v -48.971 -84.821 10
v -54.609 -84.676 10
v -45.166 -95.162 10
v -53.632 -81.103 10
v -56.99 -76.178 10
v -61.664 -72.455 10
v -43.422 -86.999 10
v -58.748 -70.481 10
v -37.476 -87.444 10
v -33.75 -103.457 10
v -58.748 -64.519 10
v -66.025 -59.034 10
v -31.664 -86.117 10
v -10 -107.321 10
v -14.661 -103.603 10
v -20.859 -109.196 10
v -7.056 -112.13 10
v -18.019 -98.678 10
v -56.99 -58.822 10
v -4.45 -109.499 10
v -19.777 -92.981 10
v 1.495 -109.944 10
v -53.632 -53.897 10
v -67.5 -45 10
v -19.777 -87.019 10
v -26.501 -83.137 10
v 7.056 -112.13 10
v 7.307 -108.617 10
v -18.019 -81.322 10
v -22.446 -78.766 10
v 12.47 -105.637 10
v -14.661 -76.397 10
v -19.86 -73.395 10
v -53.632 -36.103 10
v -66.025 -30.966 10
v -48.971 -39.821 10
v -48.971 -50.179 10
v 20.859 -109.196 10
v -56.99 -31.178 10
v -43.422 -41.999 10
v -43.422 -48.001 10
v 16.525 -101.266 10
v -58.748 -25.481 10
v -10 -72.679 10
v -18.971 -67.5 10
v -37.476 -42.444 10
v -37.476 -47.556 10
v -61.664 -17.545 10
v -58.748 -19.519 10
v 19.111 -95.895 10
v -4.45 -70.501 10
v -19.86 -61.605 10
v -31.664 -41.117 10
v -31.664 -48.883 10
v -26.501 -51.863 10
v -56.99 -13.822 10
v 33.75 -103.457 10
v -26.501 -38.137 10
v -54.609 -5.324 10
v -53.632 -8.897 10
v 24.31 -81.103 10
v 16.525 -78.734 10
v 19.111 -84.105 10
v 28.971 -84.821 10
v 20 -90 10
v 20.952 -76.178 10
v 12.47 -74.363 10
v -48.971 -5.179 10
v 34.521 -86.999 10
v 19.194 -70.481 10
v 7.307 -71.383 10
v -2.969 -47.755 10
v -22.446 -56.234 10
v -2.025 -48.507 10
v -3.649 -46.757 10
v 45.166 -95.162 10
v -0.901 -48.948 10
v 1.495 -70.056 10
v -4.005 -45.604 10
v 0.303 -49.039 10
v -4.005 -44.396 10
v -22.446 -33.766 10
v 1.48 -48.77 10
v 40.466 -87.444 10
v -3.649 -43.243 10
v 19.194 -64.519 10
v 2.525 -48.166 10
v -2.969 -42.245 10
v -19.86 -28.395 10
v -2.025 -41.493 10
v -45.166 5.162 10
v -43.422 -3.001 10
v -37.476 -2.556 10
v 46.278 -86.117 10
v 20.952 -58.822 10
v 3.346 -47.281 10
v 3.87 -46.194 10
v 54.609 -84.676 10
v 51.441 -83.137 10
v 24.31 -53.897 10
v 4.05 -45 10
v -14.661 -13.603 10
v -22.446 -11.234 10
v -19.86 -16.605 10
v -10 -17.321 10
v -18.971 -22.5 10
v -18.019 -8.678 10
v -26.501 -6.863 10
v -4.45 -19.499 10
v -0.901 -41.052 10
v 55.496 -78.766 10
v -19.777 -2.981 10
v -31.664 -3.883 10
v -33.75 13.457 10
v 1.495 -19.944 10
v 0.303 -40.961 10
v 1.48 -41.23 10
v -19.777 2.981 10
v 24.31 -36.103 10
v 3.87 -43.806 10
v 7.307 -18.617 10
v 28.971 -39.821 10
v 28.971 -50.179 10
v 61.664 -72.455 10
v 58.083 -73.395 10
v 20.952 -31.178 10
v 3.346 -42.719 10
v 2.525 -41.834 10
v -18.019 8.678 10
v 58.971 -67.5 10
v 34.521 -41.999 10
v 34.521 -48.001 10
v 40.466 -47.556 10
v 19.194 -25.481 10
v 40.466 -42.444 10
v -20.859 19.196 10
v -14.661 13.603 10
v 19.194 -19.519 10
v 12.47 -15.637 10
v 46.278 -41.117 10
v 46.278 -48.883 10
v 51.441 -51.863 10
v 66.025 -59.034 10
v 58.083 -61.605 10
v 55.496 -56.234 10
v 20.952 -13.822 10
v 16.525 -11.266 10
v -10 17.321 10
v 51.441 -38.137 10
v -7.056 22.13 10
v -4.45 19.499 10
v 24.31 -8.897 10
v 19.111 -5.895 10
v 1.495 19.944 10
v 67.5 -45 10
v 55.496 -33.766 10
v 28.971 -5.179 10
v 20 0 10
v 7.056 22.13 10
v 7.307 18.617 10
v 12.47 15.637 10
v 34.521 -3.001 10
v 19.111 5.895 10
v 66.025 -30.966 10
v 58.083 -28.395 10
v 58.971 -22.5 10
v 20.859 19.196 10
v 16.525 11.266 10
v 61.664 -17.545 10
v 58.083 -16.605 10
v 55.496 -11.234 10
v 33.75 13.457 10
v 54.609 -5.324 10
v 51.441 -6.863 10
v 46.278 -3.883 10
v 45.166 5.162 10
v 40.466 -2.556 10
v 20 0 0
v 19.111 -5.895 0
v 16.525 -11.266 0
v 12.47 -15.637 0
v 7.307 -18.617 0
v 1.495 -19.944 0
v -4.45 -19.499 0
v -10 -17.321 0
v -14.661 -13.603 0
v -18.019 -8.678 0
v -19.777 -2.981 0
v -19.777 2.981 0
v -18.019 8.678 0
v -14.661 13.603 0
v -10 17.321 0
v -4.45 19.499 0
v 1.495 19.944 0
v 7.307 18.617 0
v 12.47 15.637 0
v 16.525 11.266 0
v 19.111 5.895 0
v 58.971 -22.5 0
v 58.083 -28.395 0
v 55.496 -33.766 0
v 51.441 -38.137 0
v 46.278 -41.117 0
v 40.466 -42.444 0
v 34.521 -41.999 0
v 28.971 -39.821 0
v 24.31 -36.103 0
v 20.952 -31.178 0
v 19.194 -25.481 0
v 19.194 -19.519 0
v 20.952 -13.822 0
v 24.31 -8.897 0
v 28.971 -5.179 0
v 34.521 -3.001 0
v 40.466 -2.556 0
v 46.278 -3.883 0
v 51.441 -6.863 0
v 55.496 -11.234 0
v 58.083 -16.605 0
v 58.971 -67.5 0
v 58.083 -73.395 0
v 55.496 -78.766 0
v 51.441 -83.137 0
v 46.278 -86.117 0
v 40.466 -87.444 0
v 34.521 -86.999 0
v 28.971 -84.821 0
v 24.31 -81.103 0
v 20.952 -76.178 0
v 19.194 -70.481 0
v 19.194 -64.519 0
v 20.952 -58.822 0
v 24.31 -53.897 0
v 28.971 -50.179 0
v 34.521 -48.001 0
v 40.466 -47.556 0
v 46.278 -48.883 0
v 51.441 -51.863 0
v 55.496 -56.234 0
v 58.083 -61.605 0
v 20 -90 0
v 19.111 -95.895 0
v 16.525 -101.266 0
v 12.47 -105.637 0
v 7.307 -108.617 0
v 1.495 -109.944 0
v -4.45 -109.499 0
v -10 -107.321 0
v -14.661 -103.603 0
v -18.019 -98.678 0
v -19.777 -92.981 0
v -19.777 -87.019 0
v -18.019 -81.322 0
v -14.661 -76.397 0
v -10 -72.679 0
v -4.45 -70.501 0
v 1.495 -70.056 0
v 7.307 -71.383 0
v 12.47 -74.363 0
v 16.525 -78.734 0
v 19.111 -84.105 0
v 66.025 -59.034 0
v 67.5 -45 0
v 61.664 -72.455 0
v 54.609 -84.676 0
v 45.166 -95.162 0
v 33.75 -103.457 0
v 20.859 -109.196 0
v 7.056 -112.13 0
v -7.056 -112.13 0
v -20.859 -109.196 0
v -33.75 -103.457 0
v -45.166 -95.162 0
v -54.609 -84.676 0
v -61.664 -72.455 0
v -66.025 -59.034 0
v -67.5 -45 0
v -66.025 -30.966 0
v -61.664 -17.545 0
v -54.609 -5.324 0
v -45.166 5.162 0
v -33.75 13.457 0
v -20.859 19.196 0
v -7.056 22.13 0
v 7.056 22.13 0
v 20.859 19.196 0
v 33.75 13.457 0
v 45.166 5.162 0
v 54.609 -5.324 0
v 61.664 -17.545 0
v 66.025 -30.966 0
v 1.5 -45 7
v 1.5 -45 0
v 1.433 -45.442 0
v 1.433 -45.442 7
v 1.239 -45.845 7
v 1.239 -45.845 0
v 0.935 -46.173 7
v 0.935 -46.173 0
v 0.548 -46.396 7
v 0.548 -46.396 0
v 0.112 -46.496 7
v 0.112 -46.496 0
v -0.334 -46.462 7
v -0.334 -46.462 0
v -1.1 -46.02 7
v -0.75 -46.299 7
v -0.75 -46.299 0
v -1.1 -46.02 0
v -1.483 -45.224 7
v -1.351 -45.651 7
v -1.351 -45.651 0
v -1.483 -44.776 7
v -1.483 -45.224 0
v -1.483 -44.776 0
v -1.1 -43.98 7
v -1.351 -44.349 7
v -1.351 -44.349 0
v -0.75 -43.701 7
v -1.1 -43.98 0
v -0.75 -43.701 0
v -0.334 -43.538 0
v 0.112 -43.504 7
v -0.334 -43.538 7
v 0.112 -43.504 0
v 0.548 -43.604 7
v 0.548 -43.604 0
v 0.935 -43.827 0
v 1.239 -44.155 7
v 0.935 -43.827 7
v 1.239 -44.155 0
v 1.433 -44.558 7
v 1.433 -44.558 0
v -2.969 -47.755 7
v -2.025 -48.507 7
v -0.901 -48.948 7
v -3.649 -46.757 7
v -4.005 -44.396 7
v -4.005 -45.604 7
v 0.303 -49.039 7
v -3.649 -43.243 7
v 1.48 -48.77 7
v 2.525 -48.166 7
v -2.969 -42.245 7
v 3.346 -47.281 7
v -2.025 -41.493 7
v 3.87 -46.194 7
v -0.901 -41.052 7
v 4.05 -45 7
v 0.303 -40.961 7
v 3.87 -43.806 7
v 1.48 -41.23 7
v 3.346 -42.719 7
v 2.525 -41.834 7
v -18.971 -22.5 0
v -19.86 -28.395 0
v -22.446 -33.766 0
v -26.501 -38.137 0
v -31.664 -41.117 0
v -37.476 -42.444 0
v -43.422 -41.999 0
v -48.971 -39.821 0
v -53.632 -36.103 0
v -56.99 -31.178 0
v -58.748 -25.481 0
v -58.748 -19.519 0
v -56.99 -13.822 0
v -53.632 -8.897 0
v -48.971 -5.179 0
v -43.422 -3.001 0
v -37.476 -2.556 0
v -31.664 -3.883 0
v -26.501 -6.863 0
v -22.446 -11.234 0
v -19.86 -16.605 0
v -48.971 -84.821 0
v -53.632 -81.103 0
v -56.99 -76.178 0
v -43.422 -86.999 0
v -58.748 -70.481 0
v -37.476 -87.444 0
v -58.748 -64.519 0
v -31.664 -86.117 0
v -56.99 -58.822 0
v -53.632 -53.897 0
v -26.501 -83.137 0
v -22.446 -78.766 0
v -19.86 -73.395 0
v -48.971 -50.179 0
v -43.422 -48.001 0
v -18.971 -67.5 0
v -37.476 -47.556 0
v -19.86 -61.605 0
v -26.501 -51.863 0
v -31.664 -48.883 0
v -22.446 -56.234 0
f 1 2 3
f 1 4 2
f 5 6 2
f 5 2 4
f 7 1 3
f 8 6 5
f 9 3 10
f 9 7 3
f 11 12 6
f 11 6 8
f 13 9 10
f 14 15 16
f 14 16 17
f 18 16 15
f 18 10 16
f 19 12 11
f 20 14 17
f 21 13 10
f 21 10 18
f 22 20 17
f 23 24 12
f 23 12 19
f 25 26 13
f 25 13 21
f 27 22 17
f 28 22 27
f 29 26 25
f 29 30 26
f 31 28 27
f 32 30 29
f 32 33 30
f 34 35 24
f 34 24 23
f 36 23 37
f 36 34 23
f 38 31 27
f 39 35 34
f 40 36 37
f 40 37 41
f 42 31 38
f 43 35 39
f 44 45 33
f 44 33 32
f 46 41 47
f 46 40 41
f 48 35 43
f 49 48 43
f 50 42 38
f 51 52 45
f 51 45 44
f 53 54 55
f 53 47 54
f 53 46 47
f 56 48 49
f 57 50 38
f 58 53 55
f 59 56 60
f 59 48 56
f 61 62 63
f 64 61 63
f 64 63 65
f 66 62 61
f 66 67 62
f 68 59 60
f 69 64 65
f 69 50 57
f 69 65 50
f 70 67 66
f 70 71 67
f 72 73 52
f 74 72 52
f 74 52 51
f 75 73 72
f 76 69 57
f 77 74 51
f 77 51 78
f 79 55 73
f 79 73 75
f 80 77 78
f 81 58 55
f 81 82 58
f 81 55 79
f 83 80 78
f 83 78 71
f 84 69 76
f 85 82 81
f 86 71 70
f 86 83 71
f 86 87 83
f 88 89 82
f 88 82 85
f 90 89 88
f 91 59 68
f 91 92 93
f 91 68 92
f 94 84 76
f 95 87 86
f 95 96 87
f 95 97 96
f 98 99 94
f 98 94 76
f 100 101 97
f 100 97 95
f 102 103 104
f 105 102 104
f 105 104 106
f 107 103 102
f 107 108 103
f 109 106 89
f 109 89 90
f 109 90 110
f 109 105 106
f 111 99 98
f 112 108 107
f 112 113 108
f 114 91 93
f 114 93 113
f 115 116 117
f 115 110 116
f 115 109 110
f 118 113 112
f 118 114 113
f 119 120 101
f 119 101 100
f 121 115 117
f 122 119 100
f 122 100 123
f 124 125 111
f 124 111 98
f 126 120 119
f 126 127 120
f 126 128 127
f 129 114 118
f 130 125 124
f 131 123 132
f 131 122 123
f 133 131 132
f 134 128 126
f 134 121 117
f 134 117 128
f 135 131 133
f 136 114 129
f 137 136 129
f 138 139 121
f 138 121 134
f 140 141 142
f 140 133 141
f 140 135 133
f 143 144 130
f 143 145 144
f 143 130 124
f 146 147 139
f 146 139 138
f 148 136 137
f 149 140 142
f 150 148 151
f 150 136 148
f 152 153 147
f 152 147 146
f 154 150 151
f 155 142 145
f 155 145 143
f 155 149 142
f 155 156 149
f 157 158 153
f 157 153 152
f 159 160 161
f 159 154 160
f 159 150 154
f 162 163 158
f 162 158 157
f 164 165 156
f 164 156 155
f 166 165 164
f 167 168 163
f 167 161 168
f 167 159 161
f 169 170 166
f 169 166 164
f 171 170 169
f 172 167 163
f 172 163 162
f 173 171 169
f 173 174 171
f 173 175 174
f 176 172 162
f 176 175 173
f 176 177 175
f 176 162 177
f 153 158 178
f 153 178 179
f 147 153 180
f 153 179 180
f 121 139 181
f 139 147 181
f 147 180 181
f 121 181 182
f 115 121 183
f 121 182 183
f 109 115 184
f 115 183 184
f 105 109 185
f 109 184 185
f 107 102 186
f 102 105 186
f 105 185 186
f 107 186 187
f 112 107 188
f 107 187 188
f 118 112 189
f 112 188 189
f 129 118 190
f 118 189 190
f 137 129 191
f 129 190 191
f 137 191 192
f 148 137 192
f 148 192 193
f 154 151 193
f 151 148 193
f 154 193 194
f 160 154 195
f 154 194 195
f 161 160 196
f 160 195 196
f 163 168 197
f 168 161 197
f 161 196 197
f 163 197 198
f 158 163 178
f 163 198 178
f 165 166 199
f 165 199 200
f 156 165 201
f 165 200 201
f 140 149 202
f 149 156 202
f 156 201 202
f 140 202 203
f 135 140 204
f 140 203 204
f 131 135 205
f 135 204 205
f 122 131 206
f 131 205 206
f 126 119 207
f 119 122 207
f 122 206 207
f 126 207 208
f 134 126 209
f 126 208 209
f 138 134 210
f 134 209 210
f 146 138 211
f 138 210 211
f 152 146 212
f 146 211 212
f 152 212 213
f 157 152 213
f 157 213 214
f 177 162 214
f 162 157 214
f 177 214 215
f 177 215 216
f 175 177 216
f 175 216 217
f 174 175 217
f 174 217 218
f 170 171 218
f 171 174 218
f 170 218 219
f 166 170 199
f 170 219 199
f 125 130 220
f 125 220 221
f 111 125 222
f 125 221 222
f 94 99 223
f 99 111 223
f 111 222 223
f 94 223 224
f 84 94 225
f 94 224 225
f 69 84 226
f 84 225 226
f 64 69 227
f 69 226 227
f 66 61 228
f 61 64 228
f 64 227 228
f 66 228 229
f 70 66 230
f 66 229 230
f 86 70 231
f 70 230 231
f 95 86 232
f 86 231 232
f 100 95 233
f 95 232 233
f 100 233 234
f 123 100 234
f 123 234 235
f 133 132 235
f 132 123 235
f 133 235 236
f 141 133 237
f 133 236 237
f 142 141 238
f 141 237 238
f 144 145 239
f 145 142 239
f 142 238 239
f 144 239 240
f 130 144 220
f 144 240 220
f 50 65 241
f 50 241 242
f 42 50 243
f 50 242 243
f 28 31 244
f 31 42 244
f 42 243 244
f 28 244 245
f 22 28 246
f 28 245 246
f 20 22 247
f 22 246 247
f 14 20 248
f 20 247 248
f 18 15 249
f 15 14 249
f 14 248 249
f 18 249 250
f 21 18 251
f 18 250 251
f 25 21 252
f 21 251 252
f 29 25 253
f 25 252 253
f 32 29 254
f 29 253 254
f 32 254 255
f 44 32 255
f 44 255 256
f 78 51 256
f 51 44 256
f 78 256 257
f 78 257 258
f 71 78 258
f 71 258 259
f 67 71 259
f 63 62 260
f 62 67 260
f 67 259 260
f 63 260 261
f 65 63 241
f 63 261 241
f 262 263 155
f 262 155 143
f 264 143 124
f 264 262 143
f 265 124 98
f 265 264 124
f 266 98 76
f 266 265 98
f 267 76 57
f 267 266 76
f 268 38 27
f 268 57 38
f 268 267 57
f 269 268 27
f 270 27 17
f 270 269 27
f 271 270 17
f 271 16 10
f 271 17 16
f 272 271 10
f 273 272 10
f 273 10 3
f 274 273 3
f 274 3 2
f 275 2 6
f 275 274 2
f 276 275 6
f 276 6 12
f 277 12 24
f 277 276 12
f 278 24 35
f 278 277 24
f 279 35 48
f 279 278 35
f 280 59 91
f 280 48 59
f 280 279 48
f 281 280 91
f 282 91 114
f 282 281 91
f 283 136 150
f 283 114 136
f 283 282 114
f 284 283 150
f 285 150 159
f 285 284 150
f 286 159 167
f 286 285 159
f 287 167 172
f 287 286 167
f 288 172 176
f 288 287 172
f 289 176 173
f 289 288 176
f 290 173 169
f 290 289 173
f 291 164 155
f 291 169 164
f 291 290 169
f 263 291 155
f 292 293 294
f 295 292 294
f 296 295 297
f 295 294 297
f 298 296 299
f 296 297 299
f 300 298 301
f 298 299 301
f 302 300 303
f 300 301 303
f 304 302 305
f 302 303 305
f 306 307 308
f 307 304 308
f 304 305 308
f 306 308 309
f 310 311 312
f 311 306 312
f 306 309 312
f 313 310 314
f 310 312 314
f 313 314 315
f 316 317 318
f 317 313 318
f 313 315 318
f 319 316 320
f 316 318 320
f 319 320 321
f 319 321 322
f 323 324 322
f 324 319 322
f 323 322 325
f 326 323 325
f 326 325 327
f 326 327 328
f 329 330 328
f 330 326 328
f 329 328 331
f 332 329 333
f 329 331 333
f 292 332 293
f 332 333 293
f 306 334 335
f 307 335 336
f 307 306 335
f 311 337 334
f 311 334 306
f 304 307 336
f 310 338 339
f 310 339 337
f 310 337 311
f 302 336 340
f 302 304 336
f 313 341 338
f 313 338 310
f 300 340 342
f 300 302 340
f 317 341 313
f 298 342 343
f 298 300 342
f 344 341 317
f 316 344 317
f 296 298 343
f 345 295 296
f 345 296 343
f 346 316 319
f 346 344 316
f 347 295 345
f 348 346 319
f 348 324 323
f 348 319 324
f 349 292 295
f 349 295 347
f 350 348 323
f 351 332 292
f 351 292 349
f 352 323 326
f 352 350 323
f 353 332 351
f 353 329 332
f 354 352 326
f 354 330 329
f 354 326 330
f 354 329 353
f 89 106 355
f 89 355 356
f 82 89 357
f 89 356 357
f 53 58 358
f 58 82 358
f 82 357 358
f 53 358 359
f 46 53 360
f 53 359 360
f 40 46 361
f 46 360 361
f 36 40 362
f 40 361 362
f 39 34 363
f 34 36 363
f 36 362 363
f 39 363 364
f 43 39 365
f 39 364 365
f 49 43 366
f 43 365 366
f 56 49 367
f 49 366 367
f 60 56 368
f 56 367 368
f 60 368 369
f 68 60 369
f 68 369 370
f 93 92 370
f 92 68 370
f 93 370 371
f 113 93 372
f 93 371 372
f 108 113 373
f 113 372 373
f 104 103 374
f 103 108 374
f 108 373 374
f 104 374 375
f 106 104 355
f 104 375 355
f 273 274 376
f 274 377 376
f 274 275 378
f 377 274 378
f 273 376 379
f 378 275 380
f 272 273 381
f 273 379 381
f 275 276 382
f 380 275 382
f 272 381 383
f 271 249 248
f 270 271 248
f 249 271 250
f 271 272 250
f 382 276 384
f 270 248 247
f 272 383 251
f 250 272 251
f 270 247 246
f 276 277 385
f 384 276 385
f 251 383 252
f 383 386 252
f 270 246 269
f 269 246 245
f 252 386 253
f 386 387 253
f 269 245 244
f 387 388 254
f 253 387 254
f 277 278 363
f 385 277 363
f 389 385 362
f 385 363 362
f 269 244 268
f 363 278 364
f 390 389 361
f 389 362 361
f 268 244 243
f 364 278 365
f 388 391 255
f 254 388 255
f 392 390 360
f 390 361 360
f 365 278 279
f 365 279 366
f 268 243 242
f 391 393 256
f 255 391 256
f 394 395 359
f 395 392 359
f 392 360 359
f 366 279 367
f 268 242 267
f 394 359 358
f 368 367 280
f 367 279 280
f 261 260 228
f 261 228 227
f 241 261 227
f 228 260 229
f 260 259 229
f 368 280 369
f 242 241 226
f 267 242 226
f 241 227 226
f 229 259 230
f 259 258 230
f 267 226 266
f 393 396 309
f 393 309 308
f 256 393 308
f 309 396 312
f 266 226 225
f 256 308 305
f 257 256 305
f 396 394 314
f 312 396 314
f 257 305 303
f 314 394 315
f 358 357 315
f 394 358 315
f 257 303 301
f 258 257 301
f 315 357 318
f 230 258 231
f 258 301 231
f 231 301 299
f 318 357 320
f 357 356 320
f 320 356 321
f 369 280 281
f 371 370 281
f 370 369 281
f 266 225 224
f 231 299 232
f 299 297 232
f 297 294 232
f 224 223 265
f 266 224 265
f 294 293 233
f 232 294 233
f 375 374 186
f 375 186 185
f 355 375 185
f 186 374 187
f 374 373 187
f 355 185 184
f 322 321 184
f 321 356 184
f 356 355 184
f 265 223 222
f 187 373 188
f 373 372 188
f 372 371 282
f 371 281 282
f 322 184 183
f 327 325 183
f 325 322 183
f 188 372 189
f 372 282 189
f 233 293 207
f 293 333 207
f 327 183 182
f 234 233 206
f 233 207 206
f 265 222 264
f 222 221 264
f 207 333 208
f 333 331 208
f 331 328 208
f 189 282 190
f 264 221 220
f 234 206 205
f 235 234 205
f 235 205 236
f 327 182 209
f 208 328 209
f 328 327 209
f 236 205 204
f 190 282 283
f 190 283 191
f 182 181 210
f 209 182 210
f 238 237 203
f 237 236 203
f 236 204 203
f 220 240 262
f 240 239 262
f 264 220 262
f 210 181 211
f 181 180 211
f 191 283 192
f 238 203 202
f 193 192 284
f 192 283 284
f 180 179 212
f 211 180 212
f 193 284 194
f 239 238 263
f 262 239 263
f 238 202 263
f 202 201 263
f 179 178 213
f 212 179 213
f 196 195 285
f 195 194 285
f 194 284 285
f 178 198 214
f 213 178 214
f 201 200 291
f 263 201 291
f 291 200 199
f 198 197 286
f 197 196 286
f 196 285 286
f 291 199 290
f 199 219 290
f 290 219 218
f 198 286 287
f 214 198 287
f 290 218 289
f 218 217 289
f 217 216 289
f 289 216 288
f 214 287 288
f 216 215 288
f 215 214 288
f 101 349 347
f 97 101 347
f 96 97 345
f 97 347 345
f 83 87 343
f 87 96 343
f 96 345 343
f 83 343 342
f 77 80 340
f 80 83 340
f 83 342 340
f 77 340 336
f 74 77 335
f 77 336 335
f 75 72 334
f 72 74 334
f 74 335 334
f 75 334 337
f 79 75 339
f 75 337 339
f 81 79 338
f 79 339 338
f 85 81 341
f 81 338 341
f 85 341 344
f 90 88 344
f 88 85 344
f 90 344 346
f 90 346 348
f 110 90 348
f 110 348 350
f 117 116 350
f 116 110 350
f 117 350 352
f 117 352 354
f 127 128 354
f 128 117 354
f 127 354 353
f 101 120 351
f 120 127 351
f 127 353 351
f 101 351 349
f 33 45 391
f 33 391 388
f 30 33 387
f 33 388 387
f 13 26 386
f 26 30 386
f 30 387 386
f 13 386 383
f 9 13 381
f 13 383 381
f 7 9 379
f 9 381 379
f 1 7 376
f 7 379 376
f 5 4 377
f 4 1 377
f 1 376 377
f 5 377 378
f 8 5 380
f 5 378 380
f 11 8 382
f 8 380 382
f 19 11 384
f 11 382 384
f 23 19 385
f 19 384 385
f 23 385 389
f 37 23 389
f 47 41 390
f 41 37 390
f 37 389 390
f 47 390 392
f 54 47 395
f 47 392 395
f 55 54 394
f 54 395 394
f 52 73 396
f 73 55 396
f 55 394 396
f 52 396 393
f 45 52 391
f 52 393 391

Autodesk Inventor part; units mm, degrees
ref_plane "YZ Plane" through (0, 0, 0) normal (1, 0, 0) x (0, 1, 0)
ref_plane "XZ Plane" through (0, 0, 0) normal (0, 1, 0) x (-1, 0, 0)
ref_plane "XY Plane" through (0, 0, 0) normal (0, 0, 1) x (1, 0, 0)
sketch "Sketch1" plane through (0, 0, 0) normal (0, 0, 1) x (1, 0, 0)
  circle A0 centre (0, 0) radius 28 construction
  line L0 (75, -135) -> (-75, -135) construction
  line L1 (-75, -135) -> (-75, 65) construction
  line L2 (-75, 65) -> (75, 65) construction
  line L3 (75, 65) -> (75, -135) construction
  line L4 (75, -135) -> (-75, 65) construction
  line L5 (-75, -135) -> (75, 65) construction
  circle A1 centre (0, 0) radius 20
  circle A2 centre (-38.9711, -22.5) radius 20
  circle A3 centre (-38.9711, -67.5) radius 20
  circle A4 centre (0, -90) radius 20
  circle A5 centre (38.9711, -67.5) radius 20
  circle A6 centre (38.9711, -22.5) radius 20
  circle A7 centre (0, -45) radius 67.5
  circle A8 centre (0, -45) radius 1.5
  circle A9 centre (0, -45) radius 4.05
  point P0 (0, -35)
  dimension "d0" = 56
  dimension "d1" = 150
  dimension "d2" = 200
  dimension "d3" = 135
  dimension "d4" = 40
  dimension "d7" = 360
  dimension "d9" = 45
  dimension "d10" = 135
  dimension "d11" = 3
  dimension "d12" = 8.1
extrude "Extrusion1" add sketch "Sketch1" along normal blind 10 contours A7
extrude "Extrusion2" add sketch "Sketch1" along normal blind 7 contours A9
properties part number "FilterWheel-M40-6pos"
